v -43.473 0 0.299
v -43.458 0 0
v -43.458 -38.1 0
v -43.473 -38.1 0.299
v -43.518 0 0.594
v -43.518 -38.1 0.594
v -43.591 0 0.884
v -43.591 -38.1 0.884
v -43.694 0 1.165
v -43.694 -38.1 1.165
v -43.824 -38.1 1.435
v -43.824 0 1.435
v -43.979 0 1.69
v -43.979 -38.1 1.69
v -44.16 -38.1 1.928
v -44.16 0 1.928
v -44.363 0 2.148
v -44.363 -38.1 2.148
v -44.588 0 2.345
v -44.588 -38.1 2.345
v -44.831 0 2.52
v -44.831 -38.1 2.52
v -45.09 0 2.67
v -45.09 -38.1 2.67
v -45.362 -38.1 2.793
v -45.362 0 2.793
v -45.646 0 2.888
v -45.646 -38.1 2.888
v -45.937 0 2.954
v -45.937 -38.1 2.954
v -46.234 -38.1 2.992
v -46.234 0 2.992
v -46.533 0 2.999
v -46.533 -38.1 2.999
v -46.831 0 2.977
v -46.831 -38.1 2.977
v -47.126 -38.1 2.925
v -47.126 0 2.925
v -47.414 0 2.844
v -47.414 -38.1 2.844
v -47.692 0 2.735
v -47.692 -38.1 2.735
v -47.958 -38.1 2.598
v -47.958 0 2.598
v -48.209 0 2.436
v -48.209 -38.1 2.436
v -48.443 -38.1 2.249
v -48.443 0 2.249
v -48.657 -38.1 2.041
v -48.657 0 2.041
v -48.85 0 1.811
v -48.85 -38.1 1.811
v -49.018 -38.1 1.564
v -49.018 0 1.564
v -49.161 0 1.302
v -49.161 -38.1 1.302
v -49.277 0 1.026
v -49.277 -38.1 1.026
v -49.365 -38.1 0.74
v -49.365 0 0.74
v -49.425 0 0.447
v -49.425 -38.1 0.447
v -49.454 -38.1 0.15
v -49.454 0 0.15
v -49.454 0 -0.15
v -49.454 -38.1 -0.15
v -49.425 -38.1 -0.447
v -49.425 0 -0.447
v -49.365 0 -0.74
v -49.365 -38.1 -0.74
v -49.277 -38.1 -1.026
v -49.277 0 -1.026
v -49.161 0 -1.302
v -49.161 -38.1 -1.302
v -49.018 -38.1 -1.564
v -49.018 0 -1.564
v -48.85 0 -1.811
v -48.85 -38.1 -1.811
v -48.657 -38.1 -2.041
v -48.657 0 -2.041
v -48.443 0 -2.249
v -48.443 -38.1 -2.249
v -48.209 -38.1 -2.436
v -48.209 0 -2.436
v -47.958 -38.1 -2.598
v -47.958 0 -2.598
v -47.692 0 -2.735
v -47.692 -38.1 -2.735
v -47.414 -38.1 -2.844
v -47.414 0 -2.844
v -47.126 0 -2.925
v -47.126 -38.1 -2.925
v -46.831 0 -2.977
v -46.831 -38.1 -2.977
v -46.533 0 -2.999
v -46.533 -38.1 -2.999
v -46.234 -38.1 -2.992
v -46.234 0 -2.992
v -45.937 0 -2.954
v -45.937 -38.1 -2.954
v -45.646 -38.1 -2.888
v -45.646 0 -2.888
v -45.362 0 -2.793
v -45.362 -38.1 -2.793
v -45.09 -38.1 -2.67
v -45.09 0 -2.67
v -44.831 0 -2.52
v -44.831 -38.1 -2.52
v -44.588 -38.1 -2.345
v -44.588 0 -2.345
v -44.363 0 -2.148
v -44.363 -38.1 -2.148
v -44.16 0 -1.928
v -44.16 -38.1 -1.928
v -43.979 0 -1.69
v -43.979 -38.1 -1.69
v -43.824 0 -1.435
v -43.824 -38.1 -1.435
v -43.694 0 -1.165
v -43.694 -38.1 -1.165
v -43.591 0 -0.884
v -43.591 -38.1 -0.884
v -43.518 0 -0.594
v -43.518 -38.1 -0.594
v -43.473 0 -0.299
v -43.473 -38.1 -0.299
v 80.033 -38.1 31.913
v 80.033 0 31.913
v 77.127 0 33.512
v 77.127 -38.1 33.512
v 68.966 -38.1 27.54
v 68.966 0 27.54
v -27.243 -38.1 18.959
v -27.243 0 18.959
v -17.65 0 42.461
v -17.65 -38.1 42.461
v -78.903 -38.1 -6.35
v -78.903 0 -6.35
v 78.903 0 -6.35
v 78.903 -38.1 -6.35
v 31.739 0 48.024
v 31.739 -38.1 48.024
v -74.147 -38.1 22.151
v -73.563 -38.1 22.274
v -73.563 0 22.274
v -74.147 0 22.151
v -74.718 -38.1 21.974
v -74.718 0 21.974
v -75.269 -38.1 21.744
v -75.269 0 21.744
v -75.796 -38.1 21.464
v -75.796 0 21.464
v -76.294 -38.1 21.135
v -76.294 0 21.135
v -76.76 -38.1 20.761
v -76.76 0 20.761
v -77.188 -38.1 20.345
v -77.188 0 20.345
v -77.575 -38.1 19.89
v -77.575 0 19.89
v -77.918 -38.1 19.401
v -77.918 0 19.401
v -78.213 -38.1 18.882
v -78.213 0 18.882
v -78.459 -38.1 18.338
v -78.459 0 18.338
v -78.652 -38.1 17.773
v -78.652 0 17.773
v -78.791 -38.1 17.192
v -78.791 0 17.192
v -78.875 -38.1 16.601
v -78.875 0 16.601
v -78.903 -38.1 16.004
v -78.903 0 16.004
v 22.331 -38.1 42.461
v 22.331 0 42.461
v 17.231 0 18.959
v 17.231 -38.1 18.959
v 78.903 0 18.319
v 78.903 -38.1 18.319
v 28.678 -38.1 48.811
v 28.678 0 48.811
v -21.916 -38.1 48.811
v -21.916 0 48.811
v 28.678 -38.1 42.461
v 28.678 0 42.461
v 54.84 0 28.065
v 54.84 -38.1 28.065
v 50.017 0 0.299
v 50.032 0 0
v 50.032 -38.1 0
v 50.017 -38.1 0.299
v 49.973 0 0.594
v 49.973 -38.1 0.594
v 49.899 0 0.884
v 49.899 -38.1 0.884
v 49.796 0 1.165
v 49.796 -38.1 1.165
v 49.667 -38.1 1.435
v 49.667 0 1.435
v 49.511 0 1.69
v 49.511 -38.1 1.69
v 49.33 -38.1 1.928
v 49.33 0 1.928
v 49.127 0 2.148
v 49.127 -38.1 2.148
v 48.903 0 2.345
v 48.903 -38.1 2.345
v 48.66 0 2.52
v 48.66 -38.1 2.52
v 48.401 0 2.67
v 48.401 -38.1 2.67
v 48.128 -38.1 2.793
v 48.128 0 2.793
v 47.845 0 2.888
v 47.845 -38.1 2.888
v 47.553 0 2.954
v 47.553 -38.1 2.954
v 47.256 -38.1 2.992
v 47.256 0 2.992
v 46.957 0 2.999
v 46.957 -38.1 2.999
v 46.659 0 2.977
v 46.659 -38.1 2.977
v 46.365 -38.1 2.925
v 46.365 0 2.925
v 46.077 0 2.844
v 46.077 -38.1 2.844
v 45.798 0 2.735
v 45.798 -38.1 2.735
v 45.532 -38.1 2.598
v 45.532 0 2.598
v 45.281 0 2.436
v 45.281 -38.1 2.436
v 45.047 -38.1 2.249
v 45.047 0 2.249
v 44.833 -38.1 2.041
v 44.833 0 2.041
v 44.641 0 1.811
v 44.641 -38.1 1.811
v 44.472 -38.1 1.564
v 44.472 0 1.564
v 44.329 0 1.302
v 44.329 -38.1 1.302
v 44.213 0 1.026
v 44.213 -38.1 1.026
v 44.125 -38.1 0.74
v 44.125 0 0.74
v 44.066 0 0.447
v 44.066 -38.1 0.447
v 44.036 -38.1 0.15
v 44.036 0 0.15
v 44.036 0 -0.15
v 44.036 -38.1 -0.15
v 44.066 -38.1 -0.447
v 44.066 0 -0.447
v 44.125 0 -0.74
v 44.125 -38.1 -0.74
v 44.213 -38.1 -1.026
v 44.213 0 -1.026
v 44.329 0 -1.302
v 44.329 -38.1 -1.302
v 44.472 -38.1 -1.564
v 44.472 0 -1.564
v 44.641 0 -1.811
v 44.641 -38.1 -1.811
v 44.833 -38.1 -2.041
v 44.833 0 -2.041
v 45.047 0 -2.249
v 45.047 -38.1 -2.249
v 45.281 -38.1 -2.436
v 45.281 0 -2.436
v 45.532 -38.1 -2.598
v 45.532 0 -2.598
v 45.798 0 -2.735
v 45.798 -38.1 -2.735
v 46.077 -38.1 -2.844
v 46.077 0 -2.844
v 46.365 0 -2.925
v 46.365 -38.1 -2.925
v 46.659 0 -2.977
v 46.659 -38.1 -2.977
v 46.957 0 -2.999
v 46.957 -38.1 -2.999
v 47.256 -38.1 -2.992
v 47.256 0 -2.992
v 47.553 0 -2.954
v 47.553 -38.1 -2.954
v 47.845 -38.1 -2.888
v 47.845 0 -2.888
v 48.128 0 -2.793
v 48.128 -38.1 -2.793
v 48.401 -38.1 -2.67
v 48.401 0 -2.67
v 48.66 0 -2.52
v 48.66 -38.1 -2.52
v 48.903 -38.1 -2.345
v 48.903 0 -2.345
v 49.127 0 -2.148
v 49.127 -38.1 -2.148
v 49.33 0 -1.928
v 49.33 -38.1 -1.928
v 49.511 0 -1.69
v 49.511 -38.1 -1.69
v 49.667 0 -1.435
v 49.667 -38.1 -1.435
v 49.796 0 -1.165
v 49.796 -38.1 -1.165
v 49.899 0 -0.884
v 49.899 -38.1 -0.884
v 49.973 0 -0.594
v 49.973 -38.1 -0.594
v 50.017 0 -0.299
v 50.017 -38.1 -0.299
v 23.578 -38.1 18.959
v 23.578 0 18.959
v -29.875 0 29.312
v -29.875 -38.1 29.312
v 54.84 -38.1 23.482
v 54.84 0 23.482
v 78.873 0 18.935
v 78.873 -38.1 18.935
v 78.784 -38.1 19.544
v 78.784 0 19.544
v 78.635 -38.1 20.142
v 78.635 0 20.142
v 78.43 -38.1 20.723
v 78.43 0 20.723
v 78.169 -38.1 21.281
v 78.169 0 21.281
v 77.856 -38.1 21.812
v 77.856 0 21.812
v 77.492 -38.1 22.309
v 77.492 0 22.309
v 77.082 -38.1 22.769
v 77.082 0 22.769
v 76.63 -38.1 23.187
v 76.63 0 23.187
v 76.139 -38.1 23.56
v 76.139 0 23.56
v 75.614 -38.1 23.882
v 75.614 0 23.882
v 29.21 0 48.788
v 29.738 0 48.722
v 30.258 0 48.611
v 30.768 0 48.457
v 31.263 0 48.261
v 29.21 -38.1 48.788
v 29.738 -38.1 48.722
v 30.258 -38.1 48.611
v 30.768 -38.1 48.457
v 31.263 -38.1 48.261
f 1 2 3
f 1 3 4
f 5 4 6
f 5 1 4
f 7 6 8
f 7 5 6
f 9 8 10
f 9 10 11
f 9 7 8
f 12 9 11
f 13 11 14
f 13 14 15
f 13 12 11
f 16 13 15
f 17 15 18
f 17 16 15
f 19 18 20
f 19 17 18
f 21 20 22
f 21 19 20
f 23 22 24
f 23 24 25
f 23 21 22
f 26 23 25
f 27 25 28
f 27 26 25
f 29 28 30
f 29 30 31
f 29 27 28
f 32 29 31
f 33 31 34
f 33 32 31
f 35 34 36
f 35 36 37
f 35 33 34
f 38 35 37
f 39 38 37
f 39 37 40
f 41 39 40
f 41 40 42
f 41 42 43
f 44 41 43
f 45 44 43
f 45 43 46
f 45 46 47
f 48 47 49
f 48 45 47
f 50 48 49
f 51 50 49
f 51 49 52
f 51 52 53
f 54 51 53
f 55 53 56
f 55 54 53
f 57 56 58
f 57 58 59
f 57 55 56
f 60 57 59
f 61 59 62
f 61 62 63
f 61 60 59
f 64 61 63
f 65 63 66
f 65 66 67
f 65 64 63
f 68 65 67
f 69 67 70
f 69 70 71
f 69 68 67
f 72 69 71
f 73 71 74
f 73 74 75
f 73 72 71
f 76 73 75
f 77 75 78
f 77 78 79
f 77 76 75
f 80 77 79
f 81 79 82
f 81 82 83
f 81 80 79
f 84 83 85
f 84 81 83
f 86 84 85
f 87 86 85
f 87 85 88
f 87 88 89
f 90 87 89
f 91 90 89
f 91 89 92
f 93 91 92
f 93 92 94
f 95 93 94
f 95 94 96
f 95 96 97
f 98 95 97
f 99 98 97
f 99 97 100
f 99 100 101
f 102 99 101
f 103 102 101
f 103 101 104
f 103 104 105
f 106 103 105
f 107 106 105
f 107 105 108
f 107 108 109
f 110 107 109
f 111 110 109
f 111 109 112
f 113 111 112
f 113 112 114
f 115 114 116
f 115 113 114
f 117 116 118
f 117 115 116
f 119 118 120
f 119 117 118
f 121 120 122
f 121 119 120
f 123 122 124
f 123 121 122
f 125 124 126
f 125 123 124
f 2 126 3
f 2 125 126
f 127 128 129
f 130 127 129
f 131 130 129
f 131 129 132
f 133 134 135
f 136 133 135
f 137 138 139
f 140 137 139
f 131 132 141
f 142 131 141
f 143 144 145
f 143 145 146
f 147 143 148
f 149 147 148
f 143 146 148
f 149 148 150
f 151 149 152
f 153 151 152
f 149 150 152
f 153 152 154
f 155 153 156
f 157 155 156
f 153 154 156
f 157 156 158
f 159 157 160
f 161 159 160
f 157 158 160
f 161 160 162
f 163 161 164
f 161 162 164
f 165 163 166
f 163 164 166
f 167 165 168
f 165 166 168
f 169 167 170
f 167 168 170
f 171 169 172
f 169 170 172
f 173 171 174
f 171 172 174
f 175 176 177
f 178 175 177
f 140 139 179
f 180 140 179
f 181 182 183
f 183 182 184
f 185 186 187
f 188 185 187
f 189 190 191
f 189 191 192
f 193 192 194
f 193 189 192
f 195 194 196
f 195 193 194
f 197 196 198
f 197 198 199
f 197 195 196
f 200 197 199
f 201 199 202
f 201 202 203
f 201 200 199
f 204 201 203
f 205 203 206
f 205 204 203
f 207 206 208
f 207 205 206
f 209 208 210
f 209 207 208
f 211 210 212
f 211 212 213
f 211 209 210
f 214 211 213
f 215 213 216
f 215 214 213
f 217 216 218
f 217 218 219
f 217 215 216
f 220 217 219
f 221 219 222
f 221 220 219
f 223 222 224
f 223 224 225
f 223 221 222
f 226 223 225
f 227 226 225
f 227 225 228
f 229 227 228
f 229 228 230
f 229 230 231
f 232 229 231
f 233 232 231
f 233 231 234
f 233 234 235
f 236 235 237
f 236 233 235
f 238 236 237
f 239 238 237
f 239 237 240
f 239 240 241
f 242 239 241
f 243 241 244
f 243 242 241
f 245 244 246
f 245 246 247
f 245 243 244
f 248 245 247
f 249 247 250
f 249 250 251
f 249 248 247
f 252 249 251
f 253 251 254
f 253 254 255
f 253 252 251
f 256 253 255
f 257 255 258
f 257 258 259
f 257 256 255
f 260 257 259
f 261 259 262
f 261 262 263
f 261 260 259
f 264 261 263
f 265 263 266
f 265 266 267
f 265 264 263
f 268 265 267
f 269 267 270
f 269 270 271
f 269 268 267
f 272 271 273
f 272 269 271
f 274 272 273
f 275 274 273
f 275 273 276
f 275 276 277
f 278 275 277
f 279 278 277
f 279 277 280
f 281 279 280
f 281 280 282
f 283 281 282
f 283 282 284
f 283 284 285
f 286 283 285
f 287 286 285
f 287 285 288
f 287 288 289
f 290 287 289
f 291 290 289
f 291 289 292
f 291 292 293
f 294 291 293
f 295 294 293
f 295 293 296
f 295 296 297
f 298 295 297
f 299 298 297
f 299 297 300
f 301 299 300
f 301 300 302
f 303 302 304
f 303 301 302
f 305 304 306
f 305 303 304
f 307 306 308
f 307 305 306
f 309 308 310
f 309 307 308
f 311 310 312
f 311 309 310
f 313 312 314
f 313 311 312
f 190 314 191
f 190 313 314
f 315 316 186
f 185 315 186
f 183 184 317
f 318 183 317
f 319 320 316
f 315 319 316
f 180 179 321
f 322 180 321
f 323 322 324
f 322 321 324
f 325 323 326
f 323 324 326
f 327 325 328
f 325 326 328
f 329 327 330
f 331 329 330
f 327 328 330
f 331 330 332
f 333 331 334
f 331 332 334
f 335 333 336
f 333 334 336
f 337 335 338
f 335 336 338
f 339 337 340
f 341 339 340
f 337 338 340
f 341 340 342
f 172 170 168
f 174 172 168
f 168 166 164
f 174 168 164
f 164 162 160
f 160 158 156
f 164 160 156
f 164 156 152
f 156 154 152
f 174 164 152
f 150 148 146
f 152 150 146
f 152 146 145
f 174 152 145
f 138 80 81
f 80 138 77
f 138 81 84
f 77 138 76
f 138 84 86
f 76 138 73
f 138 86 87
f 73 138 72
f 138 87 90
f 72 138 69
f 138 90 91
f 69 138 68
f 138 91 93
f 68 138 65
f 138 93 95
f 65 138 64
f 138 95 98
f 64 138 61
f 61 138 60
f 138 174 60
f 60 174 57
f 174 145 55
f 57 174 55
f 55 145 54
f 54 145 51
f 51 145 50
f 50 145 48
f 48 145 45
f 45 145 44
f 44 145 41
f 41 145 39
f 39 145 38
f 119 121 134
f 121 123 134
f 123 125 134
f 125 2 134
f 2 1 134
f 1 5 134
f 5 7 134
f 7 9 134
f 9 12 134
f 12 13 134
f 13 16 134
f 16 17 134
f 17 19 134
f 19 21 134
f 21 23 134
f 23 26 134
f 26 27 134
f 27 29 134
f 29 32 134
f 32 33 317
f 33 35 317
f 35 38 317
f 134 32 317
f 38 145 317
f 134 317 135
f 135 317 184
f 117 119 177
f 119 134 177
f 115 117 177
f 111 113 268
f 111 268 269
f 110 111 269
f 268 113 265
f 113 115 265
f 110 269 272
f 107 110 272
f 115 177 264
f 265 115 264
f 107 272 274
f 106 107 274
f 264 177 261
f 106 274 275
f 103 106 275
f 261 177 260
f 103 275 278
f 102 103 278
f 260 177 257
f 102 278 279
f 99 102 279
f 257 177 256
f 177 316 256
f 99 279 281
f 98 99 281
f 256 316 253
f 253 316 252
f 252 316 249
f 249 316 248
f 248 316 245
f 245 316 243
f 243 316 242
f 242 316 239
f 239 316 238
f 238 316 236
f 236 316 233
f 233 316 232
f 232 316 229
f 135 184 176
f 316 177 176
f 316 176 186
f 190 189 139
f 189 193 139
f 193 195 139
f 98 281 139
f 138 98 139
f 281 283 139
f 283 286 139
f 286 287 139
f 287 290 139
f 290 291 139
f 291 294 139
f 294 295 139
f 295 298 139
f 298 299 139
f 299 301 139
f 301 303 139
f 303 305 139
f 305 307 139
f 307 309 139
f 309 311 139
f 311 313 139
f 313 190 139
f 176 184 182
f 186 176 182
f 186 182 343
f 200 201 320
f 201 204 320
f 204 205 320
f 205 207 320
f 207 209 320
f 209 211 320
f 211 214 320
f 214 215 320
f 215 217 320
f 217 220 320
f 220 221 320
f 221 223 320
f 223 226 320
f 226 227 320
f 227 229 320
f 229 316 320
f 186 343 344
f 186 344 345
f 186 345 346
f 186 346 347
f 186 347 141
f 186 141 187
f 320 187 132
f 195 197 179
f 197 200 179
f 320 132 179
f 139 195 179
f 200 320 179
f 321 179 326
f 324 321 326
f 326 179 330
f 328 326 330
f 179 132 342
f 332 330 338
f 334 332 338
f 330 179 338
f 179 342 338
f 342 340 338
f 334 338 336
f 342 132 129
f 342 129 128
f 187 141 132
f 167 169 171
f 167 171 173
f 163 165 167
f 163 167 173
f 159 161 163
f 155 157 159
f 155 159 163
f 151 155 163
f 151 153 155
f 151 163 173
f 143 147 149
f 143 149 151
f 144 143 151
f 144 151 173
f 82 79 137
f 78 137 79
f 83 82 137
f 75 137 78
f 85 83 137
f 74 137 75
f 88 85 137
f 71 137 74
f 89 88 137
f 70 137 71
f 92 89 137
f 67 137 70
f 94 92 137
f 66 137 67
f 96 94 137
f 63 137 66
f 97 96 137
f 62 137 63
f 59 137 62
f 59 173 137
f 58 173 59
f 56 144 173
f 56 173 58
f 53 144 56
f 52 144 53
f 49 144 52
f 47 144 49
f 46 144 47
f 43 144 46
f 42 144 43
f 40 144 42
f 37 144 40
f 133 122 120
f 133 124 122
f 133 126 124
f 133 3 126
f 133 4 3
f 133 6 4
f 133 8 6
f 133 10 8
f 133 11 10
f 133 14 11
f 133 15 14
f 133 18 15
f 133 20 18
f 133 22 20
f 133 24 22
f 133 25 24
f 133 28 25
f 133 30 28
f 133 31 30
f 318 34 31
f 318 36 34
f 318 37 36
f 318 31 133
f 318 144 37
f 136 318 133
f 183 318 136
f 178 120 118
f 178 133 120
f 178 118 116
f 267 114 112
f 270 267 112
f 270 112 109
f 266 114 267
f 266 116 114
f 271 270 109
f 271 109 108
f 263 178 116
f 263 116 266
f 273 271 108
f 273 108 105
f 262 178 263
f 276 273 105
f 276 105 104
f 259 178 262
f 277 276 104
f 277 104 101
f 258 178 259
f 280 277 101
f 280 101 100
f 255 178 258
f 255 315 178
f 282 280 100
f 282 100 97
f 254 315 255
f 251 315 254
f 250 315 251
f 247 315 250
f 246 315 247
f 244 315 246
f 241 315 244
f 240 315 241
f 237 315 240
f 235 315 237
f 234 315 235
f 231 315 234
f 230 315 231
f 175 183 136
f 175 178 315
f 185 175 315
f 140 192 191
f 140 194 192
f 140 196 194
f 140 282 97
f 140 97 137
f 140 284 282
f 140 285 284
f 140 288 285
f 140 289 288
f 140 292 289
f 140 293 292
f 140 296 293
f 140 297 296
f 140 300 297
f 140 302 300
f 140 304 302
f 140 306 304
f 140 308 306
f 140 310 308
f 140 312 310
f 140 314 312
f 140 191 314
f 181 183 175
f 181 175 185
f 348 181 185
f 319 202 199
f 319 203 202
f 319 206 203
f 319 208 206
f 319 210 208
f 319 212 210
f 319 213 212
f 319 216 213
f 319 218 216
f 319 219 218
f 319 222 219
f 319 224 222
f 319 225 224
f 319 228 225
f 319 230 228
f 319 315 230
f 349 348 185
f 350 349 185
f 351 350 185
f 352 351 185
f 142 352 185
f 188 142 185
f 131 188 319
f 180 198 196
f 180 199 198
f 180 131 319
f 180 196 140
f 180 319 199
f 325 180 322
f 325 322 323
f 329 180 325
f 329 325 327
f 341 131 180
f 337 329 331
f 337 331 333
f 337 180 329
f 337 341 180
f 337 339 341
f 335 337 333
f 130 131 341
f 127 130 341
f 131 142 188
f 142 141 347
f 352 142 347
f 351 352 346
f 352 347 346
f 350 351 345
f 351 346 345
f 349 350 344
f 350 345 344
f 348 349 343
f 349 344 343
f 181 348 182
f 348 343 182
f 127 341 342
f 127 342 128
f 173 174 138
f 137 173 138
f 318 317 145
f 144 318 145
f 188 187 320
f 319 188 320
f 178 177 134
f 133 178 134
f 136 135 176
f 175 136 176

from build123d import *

# Parameters (mm, degrees)
F0_R     = 3
F1_DEPTH = 38.1


with BuildPart() as f1:
    # F0 (on Front) → F1 (new body)
    with BuildSketch(Plane.XZ):
        with BuildLine():
            ThreePointArc((-63.834237, -6.35), (-49.682526, 18.216848), (-27.958176, 0))
            ThreePointArc((-27.958176, 0), (-28.241328, -3.22435), (-29.082115, -6.35))
            Line((-29.082115, -6.35), (29.656009, -6.35))
            ThreePointArc((29.656009, -6.35), (43.80772, 18.216848), (65.53207, 0))
            ThreePointArc((65.53207, 0), (65.248919, -3.22435), (64.408131, -6.35))
            Line((64.408131, -6.35), (78.902803, -6.35))
            Line((78.902803, -6.35), (78.902803, 18.319092))
            ThreePointArc((78.902803, 18.319092), (78.019117, 21.550487), (75.614012, 23.8825))
            Line((75.614012, 23.8825), (80.032745, 31.913057))
            Line((80.032745, 31.913057), (77.126751, 33.512051))
            Line((77.126751, 33.512051), (68.966064, 27.540465))
            Line((68.966064, 27.540465), (31.739181, 48.02418))
            ThreePointArc((31.739181, 48.02418), (30.258299, 48.610981), (28.677972, 48.810773))
            Line((28.677972, 48.810773), (-21.916144, 48.810773))
            Line((-21.916144, 48.810773), (-29.875312, 29.312046))
            Line((-29.875312, 29.312046), (-73.56282, 22.273607))
            ThreePointArc((-73.56282, 22.273607), (-77.386855, 20.122025), (-78.902803, 16.004447))
            Line((-78.902803, 16.004447), (-78.902803, -6.35))
            Line((-78.902803, -6.35), (-63.834237, -6.35))
        make_face()
        Polygon((-27.242659, 18.959029), (-17.649503, 42.460773), (22.330722, 42.460773), (17.231188, 18.959029), align=None, mode=Mode.SUBTRACT)
        Polygon((23.578439, 18.959029), (28.677972, 42.460773), (54.840085, 28.065335), (54.840085, 23.482008), align=None, mode=Mode.SUBTRACT)
        with BuildLine():
            ThreePointArc((-29.082115, -6.35), (-28.241328, -3.22435), (-27.958176, 0))
            ThreePointArc((-27.958176, 0), (-49.682526, 18.216848), (-63.834237, -6.35))
            Line((-63.834237, -6.35), (-29.082115, -6.35))
        make_face()
        with Locations((-46.458176, 0)):
            Circle(F0_R, mode=Mode.SUBTRACT)
        with BuildLine():
            ThreePointArc((65.53207, 0), (43.80772, 18.216848), (29.656009, -6.35))
            Line((29.656009, -6.35), (64.408131, -6.35))
            ThreePointArc((64.408131, -6.35), (65.248919, -3.22435), (65.53207, 0))
        make_face()
        with Locations((47.03207, 0)):
            Circle(F0_R, mode=Mode.SUBTRACT)
    extrude(amount=F1_DEPTH)


solid = f1.part
